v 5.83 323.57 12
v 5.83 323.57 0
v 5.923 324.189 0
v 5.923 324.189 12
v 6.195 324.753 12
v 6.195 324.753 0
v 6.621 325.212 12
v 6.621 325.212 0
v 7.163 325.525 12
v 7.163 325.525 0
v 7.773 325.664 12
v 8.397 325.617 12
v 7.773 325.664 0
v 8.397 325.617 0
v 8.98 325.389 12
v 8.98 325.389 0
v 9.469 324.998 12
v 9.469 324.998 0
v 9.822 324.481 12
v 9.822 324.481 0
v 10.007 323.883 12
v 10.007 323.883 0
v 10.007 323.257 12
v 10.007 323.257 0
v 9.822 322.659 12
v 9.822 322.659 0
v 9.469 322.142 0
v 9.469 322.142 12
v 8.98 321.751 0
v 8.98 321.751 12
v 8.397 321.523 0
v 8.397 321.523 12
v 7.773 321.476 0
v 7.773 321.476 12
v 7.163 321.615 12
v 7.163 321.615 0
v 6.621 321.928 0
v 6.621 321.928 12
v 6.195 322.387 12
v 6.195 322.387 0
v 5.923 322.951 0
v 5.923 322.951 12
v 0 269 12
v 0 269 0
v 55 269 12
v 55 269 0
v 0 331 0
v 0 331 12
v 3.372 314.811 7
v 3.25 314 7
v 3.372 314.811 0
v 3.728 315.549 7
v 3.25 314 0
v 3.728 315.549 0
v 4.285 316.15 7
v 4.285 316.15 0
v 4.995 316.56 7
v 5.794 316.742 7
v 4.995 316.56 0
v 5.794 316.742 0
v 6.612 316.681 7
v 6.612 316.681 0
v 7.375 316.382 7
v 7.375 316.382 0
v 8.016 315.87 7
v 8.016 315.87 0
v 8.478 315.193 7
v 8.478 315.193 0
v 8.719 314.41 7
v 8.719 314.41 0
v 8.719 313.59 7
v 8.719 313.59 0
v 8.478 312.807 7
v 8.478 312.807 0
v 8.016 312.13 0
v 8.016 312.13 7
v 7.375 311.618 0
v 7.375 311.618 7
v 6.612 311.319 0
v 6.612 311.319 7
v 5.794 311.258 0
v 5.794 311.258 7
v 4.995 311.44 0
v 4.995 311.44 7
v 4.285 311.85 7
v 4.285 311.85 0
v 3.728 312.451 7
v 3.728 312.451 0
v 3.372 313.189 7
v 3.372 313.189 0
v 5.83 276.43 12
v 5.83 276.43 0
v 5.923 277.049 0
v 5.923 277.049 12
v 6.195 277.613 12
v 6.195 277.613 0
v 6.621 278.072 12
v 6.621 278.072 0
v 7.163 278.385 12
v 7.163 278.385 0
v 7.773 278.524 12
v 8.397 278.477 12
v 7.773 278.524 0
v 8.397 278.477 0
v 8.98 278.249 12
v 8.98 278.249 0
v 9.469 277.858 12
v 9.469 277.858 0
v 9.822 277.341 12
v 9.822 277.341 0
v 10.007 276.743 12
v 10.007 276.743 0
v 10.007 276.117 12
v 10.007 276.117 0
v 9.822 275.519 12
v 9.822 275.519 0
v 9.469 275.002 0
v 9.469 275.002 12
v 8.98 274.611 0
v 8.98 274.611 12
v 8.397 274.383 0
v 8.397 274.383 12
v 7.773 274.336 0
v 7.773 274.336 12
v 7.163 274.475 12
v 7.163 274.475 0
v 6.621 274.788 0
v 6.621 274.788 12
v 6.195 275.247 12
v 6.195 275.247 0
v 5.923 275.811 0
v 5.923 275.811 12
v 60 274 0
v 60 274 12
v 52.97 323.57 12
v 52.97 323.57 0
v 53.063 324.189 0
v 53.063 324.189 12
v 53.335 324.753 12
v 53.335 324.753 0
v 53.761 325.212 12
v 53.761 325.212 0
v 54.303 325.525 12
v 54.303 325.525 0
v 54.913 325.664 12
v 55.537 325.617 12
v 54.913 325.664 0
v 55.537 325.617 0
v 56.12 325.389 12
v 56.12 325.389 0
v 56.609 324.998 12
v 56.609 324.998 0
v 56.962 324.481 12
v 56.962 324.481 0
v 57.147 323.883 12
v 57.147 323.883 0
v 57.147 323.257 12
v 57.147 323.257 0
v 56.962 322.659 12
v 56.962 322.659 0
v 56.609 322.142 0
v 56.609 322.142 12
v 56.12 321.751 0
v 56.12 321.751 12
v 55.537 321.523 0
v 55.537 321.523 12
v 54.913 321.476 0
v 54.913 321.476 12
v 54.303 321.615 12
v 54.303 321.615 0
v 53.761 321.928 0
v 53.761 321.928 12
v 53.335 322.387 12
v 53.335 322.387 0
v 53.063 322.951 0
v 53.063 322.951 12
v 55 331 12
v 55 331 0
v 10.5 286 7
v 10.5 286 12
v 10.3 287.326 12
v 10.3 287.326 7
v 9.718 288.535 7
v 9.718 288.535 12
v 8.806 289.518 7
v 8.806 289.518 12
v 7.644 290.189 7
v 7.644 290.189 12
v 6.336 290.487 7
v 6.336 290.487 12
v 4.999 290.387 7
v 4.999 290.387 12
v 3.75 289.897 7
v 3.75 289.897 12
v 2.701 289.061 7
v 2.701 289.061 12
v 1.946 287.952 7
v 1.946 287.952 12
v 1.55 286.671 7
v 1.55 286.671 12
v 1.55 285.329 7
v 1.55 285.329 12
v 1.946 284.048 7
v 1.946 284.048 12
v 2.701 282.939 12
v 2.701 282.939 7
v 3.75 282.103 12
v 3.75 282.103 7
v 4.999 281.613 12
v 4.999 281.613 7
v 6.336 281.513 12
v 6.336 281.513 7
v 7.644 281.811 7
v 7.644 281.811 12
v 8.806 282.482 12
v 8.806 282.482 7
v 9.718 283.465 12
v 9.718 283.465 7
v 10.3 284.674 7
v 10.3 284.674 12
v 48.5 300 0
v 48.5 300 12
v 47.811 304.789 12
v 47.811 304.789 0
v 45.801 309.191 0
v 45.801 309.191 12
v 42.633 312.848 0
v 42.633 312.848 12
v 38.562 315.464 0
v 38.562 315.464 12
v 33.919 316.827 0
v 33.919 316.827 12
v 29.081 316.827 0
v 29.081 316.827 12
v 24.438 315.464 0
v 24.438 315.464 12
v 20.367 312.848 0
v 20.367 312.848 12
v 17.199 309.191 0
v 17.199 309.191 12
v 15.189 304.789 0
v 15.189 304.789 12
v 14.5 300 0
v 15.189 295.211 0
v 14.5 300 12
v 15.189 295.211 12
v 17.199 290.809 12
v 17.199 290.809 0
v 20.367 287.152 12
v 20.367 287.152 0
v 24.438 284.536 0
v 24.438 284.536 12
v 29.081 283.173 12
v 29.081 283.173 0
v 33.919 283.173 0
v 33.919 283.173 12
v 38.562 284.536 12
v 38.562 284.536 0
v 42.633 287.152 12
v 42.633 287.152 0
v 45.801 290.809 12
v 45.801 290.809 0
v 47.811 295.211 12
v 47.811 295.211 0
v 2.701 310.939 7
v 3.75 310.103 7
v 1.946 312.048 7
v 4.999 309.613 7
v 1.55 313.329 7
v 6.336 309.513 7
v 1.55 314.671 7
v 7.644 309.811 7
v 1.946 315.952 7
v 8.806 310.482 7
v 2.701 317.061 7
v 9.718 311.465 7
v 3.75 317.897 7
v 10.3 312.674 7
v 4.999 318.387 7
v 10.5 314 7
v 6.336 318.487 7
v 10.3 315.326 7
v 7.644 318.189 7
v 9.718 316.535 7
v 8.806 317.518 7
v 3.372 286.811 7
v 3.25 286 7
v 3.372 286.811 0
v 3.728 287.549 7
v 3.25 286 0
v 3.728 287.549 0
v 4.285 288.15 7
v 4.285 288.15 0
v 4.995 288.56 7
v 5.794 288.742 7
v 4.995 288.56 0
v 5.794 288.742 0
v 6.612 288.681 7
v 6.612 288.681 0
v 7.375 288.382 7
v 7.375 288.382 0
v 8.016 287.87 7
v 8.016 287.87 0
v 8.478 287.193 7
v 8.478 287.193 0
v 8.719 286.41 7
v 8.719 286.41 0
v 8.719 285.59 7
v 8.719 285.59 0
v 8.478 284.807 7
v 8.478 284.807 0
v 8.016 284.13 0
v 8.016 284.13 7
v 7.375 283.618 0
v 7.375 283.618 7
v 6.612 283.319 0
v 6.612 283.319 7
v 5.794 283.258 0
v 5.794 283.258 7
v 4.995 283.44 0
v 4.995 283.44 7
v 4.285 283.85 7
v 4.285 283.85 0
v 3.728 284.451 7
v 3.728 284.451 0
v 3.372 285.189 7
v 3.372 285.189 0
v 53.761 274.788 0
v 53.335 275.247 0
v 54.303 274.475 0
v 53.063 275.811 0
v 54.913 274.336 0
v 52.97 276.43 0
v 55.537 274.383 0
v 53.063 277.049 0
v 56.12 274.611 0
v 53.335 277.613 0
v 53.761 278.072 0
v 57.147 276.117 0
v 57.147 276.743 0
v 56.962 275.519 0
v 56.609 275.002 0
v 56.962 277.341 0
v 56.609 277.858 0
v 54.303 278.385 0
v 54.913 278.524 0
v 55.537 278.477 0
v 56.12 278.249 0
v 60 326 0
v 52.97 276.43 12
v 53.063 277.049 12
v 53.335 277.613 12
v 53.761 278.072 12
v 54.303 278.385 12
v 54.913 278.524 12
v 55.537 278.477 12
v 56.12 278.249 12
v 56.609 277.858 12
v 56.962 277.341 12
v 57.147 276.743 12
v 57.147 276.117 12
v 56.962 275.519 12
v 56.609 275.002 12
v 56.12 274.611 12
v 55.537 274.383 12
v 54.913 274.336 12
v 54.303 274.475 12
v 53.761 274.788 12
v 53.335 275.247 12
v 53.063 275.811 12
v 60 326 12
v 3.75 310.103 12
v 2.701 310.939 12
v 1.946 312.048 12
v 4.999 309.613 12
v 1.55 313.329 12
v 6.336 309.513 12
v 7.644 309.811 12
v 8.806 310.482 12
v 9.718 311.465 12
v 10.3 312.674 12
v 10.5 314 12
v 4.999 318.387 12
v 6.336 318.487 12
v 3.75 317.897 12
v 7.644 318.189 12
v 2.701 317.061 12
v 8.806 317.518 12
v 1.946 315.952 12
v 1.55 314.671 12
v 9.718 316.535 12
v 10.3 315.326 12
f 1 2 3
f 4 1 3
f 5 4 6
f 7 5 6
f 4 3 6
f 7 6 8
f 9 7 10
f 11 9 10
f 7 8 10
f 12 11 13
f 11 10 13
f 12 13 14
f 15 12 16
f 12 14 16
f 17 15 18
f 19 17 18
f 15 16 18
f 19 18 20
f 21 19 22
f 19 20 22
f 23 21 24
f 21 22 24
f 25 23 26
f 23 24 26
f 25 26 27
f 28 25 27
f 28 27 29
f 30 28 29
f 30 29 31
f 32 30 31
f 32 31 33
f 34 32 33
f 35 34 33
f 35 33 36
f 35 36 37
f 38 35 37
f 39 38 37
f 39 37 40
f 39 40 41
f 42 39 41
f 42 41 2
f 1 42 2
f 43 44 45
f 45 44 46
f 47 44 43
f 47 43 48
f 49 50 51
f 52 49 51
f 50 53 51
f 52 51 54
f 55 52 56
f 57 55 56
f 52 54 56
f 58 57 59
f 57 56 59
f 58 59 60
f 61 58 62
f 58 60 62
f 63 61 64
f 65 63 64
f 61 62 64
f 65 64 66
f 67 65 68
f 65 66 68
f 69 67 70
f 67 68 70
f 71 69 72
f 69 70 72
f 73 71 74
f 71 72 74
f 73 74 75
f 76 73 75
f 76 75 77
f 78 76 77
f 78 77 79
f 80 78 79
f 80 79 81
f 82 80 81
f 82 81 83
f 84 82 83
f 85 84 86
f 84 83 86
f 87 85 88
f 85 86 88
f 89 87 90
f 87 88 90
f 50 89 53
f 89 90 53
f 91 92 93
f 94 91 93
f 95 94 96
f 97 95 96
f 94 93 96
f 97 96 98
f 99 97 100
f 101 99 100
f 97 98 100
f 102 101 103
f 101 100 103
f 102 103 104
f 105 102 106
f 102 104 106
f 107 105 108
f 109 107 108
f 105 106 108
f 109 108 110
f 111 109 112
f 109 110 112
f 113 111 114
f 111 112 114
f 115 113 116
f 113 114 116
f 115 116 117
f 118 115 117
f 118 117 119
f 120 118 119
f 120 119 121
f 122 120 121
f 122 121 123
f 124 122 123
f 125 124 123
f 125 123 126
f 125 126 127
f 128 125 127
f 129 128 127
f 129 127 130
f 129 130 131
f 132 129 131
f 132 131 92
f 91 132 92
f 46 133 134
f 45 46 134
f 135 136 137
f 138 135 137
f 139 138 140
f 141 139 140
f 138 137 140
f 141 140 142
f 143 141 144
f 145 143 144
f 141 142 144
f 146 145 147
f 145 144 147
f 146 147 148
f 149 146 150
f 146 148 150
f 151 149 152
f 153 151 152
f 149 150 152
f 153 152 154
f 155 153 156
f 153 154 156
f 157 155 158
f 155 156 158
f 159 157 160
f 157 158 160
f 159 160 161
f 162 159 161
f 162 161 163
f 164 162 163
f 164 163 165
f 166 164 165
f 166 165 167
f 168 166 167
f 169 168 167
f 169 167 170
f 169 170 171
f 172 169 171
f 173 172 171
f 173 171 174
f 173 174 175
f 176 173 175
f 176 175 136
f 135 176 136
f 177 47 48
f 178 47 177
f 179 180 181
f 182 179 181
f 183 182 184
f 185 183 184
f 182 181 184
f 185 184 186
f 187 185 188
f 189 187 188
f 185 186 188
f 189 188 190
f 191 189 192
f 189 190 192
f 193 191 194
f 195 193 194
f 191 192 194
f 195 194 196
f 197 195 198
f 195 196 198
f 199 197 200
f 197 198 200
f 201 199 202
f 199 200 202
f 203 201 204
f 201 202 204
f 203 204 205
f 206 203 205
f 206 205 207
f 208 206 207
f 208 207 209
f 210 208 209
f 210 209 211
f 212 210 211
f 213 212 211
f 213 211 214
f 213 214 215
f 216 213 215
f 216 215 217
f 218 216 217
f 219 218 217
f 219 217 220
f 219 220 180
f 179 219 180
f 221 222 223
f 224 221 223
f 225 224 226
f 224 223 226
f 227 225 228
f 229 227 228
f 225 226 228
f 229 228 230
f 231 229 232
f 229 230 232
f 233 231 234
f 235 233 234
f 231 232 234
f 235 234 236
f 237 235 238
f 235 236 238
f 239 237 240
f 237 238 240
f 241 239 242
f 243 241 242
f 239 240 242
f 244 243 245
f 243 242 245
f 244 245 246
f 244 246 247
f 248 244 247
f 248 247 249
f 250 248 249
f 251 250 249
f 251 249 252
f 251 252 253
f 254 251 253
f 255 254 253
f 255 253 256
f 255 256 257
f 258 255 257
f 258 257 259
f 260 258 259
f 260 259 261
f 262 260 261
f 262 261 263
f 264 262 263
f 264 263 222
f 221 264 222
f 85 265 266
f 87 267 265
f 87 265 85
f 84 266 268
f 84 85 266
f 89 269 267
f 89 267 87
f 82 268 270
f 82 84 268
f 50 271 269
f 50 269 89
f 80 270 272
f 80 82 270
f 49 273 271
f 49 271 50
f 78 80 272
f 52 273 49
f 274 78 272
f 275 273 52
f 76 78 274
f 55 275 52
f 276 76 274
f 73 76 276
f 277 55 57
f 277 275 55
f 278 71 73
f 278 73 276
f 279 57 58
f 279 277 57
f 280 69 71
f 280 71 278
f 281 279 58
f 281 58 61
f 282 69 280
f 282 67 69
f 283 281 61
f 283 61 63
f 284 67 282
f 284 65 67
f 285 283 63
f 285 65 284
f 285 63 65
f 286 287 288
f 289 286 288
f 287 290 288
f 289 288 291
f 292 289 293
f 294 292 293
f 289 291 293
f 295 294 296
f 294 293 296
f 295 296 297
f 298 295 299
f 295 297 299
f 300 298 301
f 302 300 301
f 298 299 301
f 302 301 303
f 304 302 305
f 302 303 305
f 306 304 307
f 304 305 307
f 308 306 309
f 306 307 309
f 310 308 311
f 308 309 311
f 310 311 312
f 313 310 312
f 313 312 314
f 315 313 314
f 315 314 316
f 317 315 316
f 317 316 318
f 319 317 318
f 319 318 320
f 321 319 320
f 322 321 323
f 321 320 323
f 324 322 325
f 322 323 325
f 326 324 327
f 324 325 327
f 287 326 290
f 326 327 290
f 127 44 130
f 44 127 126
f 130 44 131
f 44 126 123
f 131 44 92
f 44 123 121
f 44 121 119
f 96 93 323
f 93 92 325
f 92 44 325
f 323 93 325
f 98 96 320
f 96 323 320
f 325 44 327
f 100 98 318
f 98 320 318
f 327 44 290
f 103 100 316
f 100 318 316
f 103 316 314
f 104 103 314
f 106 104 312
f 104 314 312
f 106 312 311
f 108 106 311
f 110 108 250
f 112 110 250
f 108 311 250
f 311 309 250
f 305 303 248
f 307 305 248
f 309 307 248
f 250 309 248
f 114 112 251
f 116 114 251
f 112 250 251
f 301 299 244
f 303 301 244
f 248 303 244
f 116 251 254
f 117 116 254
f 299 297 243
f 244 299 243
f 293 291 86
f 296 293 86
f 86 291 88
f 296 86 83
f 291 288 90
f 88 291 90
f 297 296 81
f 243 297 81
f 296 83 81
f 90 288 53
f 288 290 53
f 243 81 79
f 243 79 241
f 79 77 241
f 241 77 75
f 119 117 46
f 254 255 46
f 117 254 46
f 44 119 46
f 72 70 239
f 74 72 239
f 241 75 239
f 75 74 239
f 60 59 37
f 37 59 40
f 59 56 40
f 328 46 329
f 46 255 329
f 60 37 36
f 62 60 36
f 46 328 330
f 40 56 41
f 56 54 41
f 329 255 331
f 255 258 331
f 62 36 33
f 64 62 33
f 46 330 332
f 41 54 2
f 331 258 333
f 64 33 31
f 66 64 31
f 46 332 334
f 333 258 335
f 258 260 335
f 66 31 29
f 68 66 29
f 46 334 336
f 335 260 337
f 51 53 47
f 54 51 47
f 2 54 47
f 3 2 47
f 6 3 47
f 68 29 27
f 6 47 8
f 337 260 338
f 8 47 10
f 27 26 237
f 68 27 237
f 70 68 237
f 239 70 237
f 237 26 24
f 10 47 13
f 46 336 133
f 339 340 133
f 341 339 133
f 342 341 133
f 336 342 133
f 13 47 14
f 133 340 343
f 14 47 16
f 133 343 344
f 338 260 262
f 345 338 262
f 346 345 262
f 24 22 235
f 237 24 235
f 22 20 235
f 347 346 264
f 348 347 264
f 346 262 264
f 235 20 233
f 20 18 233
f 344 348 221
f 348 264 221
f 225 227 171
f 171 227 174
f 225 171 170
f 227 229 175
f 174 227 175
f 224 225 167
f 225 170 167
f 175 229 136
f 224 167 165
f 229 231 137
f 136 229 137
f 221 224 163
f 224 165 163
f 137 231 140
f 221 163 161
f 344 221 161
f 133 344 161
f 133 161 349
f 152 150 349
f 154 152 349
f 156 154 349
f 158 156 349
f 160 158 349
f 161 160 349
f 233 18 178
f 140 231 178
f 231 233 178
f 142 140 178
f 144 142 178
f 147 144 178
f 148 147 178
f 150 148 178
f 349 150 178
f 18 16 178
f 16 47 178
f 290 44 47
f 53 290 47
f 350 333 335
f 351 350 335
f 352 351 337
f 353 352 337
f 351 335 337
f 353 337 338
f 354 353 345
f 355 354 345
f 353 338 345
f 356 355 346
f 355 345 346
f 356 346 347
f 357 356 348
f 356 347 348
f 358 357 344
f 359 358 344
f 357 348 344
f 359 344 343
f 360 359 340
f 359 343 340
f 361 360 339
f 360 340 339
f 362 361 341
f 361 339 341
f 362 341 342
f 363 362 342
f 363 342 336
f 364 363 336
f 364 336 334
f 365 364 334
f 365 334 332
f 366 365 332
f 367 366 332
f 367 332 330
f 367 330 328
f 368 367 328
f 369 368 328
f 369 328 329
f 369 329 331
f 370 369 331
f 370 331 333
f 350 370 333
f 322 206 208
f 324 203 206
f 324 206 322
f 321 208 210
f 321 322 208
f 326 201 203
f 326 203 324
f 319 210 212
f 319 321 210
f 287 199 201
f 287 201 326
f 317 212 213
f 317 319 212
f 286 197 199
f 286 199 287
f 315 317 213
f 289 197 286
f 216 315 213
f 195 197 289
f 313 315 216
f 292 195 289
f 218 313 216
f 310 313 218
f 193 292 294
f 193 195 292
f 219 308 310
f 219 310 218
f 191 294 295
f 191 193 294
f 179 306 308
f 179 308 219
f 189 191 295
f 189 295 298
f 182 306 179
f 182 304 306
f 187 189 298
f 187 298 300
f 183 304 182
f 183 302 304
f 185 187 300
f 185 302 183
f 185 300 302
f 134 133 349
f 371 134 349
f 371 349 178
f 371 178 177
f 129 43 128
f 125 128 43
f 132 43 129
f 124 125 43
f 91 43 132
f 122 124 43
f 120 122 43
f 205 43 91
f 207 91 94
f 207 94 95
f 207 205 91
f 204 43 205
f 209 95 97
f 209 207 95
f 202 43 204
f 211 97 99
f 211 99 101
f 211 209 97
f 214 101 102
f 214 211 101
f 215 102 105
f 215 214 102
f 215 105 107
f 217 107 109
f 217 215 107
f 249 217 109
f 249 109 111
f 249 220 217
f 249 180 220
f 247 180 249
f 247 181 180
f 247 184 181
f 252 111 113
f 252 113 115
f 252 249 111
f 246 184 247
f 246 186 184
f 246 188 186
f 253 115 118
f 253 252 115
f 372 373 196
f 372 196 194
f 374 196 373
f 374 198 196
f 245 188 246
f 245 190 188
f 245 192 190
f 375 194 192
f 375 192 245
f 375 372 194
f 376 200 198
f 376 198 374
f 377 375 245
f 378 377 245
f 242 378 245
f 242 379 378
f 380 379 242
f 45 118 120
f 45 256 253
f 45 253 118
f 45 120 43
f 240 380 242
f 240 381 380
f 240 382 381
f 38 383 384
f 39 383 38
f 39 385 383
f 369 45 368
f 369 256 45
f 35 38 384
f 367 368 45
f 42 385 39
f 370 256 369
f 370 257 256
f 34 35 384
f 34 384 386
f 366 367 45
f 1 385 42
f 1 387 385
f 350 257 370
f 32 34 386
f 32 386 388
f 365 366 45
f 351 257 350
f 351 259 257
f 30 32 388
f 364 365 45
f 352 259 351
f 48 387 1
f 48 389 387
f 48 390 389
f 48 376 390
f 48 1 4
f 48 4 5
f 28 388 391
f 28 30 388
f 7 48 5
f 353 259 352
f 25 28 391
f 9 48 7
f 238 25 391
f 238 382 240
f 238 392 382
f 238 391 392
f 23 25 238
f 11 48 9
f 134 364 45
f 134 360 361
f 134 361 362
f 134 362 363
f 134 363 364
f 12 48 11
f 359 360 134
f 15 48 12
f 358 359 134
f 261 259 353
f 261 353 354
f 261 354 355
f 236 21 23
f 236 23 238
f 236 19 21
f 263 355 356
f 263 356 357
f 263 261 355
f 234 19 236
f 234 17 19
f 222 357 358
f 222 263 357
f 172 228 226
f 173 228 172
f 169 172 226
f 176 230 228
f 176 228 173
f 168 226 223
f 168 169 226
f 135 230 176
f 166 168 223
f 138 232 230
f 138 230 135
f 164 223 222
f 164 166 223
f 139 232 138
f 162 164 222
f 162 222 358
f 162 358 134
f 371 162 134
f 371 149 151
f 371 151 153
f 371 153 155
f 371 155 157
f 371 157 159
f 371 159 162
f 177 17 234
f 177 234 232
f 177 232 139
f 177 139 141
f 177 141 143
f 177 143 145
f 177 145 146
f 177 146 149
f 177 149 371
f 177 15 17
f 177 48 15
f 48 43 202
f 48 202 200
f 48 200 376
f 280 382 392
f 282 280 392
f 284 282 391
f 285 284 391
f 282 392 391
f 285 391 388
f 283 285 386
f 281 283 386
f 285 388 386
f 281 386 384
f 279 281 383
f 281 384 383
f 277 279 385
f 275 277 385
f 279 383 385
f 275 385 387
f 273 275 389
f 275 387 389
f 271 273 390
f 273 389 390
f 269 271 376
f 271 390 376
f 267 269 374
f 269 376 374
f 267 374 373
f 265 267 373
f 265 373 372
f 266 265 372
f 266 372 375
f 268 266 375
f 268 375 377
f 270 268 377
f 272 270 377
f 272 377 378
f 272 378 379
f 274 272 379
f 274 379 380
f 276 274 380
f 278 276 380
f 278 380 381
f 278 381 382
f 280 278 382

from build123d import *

# Parameters (mm, degrees)
SZKIC1_W                                             = 60
SZKIC1_H                                             = 62
DODANIE_WYCI_GNI_CIE1_DEPTH                          = 12
SZKIC2_R                                             = 17
WYTNIJ_WYCI_GNI_CIE1_DEPTH                           = 337.608080711
POG_BIENIE_WALCOWE_POD_M5_WKR_T_DO_CZ_CI_D           = 5.5
POG_BIENIE_WALCOWE_POD_M5_WKR_T_DO_CZ_CI_CBORE_D     = 9
POG_BIENIE_WALCOWE_POD_M5_WKR_T_DO_CZ_CI_CBORE_DEPTH = 5
OTW_R_GWINTOWANY_M5X0_81_D                           = 4.2
SFAZOWANIE1_SIZE                                     = 5


with BuildPart() as part:
    # Szkic1 → Dodanie-wyciągnięcie1 (new body)
    with BuildSketch(Plane.XY):
        with Locations((30, 300)):
            Rectangle(SZKIC1_W, SZKIC1_H)
    extrude(amount=DODANIE_WYCI_GNI_CIE1_DEPTH)

    # Szkic2 → Wytnij-wyciągnięcie1 (cut, through all)
    with BuildSketch(Plane.XY.offset(12)):
        with Locations((31.5, 300)):
            Circle(SZKIC2_R)
    extrude(amount=-WYTNIJ_WYCI_GNI_CIE1_DEPTH, mode=Mode.SUBTRACT)

    # Pogłębienie walcowe pod M5 Wkręt do części metalowych z łbem sześciokątnym1 (through all)
    with Locations(Plane.XY.offset(12)):
        with Locations((6, 314), (6, 286)):
            CounterBoreHole(POG_BIENIE_WALCOWE_POD_M5_WKR_T_DO_CZ_CI_D / 2, POG_BIENIE_WALCOWE_POD_M5_WKR_T_DO_CZ_CI_CBORE_D / 2, POG_BIENIE_WALCOWE_POD_M5_WKR_T_DO_CZ_CI_CBORE_DEPTH)

    # Otwór gwintowany M5x0.81 (through all)
    with Locations(Plane.XY.offset(12)):
        with Locations((55.07, 323.57), (55.07, 276.43), (7.93, 323.57), (7.93, 276.43)):
            Hole(OTW_R_GWINTOWANY_M5X0_81_D / 2)

    # Sfazowanie1
    sfazowanie1_edges = [part.edges().sort_by_distance(p)[0] for p in [
        (60, 331, 6),
        (60, 269, 6),
    ]]
    chamfer(sfazowanie1_edges, length=SFAZOWANIE1_SIZE)


solid = part.part
